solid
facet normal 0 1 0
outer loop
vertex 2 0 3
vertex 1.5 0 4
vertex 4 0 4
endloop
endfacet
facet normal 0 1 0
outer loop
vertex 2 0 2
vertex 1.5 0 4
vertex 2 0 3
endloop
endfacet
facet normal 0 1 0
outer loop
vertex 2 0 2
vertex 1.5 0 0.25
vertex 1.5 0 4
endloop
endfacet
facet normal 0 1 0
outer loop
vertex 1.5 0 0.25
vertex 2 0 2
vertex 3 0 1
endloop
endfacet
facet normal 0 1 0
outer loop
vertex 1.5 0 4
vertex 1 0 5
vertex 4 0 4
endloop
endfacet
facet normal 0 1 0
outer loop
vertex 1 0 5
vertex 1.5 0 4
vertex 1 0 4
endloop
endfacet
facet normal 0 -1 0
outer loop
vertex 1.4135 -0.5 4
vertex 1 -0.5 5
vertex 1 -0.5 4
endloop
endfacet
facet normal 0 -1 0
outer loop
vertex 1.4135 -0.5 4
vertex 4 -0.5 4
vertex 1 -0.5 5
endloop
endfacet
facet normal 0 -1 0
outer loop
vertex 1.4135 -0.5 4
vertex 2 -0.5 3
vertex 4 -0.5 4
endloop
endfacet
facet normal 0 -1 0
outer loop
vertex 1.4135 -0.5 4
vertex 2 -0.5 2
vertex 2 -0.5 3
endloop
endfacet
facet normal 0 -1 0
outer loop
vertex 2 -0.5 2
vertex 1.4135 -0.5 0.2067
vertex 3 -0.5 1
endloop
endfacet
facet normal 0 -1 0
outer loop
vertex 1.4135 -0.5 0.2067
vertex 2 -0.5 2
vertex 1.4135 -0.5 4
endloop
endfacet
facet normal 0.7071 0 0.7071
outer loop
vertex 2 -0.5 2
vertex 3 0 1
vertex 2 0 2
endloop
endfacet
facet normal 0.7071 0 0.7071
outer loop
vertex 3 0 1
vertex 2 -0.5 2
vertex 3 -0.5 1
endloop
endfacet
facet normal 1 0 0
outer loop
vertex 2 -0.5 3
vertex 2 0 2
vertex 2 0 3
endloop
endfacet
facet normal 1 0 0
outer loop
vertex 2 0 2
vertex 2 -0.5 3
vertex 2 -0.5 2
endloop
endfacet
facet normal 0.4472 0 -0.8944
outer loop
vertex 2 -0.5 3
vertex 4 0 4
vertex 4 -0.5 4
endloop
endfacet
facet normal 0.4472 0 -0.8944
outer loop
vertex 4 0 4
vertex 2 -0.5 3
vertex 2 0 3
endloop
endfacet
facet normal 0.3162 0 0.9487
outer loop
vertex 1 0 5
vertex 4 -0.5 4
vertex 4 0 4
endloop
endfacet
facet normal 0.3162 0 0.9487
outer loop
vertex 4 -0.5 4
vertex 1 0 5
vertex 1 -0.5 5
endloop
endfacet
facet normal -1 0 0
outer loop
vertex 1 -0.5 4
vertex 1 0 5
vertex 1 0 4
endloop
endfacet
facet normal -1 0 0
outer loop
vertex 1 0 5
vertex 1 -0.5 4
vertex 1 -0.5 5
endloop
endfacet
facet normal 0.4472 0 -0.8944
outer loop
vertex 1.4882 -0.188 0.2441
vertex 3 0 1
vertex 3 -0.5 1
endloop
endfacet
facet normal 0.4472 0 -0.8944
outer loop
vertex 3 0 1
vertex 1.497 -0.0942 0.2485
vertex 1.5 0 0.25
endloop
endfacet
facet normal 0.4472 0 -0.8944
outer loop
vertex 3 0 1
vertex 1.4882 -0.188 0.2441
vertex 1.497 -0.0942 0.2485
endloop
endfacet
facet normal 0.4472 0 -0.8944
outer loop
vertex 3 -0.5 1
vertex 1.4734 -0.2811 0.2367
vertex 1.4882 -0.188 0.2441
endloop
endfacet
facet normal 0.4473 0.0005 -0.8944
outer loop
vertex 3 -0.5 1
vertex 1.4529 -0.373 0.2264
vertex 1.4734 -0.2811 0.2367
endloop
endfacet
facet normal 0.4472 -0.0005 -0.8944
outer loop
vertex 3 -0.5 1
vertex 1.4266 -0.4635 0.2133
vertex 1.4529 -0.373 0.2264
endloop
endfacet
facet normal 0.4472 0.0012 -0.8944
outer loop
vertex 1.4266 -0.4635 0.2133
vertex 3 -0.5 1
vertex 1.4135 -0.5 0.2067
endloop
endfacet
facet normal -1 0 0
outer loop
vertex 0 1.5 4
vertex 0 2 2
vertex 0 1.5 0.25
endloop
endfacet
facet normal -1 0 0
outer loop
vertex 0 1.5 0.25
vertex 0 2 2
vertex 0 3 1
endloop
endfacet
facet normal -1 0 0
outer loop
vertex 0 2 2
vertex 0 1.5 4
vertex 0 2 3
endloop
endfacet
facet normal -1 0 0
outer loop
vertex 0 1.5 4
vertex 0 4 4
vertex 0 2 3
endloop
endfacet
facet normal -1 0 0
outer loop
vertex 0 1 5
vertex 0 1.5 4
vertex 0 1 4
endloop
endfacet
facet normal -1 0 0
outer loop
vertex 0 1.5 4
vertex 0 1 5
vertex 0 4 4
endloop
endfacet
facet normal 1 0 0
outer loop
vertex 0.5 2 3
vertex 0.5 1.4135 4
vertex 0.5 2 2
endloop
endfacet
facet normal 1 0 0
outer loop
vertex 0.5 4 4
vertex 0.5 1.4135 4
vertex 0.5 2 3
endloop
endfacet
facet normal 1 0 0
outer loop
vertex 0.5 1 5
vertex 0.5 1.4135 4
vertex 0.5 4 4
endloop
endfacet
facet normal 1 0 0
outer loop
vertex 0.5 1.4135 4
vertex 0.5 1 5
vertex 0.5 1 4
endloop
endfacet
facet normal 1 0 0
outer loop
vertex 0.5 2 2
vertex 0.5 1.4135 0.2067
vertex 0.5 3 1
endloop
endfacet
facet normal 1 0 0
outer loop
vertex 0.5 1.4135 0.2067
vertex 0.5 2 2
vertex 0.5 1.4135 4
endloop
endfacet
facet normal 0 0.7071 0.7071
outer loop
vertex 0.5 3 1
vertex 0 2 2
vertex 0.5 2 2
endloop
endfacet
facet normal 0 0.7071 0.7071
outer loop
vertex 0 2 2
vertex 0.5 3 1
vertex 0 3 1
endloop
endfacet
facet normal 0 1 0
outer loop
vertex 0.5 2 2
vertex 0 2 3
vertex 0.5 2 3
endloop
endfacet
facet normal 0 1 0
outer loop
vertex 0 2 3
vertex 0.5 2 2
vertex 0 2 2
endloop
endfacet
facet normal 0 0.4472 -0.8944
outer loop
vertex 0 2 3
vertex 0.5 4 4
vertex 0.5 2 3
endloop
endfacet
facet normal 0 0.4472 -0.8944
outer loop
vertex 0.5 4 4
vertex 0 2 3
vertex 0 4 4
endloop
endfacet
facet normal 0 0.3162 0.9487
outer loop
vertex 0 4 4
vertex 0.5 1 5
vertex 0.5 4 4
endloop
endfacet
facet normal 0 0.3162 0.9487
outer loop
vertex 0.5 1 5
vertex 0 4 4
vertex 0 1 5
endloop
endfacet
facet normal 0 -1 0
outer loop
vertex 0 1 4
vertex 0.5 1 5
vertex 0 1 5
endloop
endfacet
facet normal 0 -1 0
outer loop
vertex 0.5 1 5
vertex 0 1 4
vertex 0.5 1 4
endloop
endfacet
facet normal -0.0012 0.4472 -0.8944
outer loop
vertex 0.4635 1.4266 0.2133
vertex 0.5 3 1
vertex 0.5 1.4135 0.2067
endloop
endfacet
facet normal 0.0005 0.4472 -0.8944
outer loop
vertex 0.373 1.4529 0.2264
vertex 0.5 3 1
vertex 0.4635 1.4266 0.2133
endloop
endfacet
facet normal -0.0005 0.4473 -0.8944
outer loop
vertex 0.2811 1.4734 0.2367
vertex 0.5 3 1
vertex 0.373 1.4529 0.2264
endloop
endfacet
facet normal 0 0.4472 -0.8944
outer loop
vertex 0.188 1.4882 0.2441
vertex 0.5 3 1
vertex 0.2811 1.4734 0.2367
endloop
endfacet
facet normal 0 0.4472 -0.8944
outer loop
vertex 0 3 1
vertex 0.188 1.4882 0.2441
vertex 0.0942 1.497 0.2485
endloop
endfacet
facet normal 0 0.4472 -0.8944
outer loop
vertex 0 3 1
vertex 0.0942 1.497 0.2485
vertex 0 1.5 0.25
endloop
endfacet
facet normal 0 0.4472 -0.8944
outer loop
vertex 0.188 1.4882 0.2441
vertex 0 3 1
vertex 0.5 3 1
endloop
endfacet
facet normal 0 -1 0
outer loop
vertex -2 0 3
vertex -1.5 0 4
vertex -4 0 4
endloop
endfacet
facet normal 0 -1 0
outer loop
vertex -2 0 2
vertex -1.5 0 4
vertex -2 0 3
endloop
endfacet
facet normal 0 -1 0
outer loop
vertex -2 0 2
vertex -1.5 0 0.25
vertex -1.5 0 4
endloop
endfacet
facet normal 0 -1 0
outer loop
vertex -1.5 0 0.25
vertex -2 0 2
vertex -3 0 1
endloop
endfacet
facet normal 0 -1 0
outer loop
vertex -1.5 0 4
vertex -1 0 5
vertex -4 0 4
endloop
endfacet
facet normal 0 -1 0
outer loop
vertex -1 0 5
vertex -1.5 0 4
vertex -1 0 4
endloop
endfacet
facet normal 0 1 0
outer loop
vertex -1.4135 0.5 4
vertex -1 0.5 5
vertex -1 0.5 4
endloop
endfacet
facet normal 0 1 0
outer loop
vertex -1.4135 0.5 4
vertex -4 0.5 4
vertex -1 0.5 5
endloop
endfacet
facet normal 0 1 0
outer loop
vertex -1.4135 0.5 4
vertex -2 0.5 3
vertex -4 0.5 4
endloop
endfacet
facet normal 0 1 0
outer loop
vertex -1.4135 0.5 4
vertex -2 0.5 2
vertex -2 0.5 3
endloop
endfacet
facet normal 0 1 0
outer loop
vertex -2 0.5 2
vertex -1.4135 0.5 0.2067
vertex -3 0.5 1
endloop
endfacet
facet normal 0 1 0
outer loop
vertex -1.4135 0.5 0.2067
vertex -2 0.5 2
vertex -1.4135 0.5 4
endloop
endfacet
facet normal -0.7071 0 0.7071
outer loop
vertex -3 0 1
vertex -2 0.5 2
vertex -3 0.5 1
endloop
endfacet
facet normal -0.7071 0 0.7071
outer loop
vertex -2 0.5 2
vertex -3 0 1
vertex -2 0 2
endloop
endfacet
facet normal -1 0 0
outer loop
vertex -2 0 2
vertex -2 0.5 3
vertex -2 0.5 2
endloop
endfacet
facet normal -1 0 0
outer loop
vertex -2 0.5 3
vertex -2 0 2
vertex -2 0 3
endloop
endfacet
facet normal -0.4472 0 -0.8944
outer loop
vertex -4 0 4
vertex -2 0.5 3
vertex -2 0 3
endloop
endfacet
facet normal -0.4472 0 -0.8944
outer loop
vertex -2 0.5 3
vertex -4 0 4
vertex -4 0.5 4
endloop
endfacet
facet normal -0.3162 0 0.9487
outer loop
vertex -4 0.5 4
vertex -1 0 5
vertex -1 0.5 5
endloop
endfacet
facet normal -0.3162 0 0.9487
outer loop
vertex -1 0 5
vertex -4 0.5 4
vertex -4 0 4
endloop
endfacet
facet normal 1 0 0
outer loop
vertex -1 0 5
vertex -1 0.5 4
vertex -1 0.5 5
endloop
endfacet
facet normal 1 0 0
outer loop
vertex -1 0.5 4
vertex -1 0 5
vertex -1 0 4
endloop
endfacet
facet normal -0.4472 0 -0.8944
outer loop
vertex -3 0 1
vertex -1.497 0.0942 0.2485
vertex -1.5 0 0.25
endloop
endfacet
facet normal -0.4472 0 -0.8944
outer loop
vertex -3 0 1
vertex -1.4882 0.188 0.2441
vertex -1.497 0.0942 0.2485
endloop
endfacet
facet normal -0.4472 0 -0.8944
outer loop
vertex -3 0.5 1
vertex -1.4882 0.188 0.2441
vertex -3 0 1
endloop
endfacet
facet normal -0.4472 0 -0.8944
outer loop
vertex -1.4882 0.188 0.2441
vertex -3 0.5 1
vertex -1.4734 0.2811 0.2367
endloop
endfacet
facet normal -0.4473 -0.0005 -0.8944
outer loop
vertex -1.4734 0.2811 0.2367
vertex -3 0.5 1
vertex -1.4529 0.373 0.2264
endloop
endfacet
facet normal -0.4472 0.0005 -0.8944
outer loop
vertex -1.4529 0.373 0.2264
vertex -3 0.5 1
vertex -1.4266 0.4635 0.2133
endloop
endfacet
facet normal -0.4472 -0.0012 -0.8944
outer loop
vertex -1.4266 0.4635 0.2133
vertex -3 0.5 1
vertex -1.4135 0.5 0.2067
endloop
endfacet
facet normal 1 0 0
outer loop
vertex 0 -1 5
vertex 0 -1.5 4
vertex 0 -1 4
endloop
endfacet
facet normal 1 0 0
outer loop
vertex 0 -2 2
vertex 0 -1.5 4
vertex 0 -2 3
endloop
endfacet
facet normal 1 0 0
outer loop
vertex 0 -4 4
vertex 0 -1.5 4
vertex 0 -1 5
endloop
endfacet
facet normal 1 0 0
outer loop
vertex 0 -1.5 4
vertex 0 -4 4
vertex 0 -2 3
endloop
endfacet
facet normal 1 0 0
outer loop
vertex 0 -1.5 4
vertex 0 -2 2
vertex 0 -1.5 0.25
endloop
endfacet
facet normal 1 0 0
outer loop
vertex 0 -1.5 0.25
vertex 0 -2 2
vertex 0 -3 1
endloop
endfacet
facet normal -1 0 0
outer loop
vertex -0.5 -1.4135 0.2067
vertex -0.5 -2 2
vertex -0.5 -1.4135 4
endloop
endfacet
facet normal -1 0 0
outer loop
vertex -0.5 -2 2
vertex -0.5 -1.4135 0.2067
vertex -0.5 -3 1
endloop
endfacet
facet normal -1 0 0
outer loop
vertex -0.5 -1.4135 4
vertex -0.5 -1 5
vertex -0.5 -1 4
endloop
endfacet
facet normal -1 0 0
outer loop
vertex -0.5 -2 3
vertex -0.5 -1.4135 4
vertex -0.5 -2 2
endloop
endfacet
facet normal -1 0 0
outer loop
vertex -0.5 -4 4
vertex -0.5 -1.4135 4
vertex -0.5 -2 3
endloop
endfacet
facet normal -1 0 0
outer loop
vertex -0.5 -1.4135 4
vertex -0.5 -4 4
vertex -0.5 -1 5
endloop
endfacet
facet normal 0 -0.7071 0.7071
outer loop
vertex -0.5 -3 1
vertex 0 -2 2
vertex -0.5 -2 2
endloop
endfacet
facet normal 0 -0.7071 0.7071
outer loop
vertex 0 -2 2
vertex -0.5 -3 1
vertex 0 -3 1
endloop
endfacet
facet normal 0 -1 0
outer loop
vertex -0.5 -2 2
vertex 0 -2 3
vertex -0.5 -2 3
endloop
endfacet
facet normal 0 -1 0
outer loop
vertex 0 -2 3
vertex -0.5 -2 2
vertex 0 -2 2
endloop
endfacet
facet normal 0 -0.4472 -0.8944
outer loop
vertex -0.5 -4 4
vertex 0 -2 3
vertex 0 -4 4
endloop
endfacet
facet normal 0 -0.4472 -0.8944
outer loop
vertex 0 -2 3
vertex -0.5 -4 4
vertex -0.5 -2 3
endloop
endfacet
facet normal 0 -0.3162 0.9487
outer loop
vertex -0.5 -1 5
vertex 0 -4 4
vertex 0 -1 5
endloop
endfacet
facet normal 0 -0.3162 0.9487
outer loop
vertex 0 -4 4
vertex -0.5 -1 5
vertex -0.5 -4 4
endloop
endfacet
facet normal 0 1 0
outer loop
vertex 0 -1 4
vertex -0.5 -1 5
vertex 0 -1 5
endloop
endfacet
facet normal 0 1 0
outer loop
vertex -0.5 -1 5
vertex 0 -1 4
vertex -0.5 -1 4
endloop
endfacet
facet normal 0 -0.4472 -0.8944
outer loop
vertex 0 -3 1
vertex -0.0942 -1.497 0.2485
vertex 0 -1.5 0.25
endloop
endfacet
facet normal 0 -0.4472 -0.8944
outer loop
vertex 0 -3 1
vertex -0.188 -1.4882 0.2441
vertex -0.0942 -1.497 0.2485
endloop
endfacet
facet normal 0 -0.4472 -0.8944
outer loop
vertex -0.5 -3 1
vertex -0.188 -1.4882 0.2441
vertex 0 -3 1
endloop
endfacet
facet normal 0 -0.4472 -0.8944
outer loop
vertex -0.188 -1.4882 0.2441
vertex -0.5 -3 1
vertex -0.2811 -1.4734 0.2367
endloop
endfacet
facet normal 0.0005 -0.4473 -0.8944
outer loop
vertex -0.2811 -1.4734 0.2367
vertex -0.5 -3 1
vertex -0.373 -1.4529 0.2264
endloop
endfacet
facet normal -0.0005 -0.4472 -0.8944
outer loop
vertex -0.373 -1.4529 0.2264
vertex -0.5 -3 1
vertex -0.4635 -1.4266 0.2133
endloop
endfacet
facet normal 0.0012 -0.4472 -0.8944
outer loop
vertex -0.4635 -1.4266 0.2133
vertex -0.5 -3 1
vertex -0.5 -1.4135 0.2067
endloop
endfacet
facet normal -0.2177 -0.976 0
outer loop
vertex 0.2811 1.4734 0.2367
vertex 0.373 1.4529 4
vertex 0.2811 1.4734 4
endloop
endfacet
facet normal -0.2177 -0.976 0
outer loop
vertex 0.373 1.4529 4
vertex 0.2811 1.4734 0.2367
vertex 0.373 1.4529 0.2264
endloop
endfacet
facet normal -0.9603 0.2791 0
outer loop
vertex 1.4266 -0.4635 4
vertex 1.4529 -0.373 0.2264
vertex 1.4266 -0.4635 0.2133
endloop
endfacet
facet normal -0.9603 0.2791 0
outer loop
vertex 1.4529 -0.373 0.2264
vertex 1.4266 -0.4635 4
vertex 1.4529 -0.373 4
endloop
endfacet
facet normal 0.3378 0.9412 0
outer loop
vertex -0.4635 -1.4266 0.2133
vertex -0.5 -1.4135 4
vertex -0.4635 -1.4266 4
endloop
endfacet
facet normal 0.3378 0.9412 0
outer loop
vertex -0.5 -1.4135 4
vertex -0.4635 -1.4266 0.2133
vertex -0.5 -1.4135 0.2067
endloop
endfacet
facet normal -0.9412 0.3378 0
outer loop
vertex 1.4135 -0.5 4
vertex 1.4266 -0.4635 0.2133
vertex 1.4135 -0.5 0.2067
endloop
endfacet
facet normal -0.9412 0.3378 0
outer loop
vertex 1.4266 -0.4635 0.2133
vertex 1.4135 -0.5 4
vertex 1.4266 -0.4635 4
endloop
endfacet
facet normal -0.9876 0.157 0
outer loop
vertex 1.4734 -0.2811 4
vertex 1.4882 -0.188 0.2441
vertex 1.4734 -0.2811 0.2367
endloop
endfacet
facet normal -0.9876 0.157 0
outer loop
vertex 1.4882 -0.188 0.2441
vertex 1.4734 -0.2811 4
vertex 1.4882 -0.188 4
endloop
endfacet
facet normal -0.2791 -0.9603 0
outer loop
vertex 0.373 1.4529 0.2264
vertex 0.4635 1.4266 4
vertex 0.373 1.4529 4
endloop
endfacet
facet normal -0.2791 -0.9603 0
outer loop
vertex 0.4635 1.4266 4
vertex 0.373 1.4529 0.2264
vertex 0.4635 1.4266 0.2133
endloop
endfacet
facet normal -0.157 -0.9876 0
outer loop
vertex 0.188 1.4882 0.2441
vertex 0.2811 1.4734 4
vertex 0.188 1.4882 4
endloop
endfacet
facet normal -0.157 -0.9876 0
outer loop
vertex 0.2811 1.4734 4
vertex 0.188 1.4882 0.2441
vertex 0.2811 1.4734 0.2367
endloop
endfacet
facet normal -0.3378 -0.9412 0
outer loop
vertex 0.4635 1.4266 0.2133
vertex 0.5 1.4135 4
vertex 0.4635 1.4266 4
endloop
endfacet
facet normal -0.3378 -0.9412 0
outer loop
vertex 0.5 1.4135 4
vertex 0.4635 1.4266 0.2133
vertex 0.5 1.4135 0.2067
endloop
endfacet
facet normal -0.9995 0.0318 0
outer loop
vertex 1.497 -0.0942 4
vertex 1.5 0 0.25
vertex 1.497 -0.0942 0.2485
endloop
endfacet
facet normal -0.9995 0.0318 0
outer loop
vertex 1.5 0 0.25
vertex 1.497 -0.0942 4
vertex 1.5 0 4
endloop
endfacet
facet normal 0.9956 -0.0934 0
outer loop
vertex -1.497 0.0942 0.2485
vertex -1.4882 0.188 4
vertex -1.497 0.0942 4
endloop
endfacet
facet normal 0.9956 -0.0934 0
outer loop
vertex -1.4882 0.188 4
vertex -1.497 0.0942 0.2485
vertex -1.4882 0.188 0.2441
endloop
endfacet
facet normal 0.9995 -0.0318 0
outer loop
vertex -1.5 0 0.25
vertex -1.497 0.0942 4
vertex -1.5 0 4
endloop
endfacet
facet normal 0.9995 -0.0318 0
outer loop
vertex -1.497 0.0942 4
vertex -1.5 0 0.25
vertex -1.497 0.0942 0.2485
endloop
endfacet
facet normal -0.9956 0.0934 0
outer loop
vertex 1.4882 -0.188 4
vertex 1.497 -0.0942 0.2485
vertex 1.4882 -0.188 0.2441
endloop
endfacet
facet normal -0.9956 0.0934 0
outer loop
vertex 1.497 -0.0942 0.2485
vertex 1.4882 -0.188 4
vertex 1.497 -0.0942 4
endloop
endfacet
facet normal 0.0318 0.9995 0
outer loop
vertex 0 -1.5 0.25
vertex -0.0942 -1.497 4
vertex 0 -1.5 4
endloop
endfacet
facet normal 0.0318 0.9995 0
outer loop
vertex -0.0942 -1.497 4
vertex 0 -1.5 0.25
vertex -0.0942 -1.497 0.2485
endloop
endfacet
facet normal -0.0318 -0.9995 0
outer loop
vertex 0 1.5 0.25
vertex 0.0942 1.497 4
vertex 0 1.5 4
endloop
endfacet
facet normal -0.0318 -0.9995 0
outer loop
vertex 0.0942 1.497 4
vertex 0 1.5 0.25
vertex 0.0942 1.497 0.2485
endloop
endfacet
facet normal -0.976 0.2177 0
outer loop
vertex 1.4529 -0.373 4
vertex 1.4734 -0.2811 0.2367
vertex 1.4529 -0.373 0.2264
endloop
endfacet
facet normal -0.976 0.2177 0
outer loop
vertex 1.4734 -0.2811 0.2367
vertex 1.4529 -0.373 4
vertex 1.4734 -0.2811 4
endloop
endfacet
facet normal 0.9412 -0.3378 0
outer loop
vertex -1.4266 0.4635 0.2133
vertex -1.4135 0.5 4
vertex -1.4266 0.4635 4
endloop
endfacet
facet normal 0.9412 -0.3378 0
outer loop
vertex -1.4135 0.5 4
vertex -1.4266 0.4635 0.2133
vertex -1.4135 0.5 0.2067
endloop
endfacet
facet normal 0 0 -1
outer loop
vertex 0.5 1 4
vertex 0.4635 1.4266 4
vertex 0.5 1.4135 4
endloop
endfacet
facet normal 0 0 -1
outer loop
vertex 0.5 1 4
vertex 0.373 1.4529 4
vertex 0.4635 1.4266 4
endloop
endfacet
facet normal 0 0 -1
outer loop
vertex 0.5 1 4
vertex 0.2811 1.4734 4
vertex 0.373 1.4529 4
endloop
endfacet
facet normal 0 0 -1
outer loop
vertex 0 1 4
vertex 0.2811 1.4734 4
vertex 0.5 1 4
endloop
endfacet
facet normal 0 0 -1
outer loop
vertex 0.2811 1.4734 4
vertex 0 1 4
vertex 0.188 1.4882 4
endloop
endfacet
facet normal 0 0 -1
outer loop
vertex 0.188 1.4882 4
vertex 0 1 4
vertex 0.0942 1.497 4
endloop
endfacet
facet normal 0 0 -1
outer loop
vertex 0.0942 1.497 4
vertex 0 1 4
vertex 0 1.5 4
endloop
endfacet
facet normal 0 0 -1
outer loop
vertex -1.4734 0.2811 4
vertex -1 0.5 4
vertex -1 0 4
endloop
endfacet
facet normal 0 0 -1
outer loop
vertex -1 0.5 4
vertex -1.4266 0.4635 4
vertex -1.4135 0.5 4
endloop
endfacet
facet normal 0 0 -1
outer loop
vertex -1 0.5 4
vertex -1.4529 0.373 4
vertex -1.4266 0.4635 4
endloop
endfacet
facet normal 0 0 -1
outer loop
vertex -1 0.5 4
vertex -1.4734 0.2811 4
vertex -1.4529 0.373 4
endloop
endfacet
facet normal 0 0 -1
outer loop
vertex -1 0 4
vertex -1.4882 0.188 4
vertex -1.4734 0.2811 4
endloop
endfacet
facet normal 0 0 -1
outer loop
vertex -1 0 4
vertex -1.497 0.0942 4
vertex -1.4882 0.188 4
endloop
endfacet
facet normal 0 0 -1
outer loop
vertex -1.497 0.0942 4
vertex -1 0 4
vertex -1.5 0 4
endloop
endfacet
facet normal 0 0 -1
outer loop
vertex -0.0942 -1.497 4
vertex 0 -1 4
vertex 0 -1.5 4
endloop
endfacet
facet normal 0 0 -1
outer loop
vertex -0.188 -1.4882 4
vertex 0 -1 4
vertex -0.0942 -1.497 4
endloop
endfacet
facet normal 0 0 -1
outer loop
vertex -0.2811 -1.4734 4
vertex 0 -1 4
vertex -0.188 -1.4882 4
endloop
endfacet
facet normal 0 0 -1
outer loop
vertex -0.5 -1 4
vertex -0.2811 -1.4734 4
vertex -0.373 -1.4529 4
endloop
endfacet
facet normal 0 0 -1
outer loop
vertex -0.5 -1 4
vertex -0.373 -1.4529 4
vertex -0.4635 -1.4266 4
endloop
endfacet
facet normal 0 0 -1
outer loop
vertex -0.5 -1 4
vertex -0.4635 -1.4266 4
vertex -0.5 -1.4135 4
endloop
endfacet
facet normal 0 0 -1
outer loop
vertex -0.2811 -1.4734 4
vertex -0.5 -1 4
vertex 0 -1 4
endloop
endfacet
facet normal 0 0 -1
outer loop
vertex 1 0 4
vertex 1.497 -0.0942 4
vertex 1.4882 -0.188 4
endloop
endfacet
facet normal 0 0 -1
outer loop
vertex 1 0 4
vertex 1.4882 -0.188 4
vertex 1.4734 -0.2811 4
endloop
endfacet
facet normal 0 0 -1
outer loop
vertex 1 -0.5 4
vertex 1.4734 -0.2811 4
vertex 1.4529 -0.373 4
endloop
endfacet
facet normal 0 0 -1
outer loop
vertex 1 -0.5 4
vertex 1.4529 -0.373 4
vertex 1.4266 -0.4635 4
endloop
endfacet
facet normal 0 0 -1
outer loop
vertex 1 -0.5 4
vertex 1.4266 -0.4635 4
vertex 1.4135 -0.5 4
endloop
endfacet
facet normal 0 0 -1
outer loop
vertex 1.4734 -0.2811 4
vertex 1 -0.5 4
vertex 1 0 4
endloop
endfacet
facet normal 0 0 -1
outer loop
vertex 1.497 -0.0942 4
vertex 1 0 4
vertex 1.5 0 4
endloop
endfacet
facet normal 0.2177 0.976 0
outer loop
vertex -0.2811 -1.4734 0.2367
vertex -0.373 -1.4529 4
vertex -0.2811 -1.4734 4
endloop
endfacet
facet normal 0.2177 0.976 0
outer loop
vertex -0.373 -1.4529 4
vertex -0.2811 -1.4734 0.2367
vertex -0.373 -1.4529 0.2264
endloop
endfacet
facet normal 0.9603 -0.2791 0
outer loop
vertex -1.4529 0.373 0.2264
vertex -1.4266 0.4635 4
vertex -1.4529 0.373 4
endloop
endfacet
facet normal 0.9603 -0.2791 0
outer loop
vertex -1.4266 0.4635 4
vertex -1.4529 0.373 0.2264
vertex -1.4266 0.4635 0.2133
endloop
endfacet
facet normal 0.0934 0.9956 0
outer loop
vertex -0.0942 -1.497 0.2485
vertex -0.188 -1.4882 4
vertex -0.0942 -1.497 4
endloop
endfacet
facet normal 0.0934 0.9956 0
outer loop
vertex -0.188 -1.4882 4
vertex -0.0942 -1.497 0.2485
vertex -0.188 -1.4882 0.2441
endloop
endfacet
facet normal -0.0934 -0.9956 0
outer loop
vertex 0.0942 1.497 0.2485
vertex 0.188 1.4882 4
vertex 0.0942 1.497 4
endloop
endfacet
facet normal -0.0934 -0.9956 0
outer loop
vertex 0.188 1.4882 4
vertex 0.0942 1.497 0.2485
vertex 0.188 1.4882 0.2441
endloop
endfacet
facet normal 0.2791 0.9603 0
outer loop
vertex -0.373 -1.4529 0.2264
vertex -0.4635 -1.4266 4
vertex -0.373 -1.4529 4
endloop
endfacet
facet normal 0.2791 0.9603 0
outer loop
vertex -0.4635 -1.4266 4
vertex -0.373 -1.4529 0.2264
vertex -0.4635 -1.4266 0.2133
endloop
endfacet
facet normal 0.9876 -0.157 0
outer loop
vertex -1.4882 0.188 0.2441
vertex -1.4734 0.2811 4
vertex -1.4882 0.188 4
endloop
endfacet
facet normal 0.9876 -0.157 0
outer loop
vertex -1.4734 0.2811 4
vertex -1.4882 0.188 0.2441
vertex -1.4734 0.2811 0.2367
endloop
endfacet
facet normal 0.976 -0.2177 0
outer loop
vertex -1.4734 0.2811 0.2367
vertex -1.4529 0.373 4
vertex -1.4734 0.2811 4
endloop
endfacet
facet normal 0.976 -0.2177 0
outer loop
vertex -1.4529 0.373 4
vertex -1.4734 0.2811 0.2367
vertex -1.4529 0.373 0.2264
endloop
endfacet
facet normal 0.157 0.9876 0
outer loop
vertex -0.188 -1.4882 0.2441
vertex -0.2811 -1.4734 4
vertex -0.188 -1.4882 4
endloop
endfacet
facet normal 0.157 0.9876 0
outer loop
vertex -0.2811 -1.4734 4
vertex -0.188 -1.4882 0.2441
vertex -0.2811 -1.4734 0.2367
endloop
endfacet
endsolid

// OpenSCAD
difference(){
for (angle=[0:90:360]){
rotate([90,0,angle])
translate([1,0,0])
linear_extrude(0.5)        
	polygon( points=[[0,0],[2,1],[1,2],[1,3],[3,4],[0,5]] );
}
cylinder(4,1.5,1.5, $fn=100);
}
